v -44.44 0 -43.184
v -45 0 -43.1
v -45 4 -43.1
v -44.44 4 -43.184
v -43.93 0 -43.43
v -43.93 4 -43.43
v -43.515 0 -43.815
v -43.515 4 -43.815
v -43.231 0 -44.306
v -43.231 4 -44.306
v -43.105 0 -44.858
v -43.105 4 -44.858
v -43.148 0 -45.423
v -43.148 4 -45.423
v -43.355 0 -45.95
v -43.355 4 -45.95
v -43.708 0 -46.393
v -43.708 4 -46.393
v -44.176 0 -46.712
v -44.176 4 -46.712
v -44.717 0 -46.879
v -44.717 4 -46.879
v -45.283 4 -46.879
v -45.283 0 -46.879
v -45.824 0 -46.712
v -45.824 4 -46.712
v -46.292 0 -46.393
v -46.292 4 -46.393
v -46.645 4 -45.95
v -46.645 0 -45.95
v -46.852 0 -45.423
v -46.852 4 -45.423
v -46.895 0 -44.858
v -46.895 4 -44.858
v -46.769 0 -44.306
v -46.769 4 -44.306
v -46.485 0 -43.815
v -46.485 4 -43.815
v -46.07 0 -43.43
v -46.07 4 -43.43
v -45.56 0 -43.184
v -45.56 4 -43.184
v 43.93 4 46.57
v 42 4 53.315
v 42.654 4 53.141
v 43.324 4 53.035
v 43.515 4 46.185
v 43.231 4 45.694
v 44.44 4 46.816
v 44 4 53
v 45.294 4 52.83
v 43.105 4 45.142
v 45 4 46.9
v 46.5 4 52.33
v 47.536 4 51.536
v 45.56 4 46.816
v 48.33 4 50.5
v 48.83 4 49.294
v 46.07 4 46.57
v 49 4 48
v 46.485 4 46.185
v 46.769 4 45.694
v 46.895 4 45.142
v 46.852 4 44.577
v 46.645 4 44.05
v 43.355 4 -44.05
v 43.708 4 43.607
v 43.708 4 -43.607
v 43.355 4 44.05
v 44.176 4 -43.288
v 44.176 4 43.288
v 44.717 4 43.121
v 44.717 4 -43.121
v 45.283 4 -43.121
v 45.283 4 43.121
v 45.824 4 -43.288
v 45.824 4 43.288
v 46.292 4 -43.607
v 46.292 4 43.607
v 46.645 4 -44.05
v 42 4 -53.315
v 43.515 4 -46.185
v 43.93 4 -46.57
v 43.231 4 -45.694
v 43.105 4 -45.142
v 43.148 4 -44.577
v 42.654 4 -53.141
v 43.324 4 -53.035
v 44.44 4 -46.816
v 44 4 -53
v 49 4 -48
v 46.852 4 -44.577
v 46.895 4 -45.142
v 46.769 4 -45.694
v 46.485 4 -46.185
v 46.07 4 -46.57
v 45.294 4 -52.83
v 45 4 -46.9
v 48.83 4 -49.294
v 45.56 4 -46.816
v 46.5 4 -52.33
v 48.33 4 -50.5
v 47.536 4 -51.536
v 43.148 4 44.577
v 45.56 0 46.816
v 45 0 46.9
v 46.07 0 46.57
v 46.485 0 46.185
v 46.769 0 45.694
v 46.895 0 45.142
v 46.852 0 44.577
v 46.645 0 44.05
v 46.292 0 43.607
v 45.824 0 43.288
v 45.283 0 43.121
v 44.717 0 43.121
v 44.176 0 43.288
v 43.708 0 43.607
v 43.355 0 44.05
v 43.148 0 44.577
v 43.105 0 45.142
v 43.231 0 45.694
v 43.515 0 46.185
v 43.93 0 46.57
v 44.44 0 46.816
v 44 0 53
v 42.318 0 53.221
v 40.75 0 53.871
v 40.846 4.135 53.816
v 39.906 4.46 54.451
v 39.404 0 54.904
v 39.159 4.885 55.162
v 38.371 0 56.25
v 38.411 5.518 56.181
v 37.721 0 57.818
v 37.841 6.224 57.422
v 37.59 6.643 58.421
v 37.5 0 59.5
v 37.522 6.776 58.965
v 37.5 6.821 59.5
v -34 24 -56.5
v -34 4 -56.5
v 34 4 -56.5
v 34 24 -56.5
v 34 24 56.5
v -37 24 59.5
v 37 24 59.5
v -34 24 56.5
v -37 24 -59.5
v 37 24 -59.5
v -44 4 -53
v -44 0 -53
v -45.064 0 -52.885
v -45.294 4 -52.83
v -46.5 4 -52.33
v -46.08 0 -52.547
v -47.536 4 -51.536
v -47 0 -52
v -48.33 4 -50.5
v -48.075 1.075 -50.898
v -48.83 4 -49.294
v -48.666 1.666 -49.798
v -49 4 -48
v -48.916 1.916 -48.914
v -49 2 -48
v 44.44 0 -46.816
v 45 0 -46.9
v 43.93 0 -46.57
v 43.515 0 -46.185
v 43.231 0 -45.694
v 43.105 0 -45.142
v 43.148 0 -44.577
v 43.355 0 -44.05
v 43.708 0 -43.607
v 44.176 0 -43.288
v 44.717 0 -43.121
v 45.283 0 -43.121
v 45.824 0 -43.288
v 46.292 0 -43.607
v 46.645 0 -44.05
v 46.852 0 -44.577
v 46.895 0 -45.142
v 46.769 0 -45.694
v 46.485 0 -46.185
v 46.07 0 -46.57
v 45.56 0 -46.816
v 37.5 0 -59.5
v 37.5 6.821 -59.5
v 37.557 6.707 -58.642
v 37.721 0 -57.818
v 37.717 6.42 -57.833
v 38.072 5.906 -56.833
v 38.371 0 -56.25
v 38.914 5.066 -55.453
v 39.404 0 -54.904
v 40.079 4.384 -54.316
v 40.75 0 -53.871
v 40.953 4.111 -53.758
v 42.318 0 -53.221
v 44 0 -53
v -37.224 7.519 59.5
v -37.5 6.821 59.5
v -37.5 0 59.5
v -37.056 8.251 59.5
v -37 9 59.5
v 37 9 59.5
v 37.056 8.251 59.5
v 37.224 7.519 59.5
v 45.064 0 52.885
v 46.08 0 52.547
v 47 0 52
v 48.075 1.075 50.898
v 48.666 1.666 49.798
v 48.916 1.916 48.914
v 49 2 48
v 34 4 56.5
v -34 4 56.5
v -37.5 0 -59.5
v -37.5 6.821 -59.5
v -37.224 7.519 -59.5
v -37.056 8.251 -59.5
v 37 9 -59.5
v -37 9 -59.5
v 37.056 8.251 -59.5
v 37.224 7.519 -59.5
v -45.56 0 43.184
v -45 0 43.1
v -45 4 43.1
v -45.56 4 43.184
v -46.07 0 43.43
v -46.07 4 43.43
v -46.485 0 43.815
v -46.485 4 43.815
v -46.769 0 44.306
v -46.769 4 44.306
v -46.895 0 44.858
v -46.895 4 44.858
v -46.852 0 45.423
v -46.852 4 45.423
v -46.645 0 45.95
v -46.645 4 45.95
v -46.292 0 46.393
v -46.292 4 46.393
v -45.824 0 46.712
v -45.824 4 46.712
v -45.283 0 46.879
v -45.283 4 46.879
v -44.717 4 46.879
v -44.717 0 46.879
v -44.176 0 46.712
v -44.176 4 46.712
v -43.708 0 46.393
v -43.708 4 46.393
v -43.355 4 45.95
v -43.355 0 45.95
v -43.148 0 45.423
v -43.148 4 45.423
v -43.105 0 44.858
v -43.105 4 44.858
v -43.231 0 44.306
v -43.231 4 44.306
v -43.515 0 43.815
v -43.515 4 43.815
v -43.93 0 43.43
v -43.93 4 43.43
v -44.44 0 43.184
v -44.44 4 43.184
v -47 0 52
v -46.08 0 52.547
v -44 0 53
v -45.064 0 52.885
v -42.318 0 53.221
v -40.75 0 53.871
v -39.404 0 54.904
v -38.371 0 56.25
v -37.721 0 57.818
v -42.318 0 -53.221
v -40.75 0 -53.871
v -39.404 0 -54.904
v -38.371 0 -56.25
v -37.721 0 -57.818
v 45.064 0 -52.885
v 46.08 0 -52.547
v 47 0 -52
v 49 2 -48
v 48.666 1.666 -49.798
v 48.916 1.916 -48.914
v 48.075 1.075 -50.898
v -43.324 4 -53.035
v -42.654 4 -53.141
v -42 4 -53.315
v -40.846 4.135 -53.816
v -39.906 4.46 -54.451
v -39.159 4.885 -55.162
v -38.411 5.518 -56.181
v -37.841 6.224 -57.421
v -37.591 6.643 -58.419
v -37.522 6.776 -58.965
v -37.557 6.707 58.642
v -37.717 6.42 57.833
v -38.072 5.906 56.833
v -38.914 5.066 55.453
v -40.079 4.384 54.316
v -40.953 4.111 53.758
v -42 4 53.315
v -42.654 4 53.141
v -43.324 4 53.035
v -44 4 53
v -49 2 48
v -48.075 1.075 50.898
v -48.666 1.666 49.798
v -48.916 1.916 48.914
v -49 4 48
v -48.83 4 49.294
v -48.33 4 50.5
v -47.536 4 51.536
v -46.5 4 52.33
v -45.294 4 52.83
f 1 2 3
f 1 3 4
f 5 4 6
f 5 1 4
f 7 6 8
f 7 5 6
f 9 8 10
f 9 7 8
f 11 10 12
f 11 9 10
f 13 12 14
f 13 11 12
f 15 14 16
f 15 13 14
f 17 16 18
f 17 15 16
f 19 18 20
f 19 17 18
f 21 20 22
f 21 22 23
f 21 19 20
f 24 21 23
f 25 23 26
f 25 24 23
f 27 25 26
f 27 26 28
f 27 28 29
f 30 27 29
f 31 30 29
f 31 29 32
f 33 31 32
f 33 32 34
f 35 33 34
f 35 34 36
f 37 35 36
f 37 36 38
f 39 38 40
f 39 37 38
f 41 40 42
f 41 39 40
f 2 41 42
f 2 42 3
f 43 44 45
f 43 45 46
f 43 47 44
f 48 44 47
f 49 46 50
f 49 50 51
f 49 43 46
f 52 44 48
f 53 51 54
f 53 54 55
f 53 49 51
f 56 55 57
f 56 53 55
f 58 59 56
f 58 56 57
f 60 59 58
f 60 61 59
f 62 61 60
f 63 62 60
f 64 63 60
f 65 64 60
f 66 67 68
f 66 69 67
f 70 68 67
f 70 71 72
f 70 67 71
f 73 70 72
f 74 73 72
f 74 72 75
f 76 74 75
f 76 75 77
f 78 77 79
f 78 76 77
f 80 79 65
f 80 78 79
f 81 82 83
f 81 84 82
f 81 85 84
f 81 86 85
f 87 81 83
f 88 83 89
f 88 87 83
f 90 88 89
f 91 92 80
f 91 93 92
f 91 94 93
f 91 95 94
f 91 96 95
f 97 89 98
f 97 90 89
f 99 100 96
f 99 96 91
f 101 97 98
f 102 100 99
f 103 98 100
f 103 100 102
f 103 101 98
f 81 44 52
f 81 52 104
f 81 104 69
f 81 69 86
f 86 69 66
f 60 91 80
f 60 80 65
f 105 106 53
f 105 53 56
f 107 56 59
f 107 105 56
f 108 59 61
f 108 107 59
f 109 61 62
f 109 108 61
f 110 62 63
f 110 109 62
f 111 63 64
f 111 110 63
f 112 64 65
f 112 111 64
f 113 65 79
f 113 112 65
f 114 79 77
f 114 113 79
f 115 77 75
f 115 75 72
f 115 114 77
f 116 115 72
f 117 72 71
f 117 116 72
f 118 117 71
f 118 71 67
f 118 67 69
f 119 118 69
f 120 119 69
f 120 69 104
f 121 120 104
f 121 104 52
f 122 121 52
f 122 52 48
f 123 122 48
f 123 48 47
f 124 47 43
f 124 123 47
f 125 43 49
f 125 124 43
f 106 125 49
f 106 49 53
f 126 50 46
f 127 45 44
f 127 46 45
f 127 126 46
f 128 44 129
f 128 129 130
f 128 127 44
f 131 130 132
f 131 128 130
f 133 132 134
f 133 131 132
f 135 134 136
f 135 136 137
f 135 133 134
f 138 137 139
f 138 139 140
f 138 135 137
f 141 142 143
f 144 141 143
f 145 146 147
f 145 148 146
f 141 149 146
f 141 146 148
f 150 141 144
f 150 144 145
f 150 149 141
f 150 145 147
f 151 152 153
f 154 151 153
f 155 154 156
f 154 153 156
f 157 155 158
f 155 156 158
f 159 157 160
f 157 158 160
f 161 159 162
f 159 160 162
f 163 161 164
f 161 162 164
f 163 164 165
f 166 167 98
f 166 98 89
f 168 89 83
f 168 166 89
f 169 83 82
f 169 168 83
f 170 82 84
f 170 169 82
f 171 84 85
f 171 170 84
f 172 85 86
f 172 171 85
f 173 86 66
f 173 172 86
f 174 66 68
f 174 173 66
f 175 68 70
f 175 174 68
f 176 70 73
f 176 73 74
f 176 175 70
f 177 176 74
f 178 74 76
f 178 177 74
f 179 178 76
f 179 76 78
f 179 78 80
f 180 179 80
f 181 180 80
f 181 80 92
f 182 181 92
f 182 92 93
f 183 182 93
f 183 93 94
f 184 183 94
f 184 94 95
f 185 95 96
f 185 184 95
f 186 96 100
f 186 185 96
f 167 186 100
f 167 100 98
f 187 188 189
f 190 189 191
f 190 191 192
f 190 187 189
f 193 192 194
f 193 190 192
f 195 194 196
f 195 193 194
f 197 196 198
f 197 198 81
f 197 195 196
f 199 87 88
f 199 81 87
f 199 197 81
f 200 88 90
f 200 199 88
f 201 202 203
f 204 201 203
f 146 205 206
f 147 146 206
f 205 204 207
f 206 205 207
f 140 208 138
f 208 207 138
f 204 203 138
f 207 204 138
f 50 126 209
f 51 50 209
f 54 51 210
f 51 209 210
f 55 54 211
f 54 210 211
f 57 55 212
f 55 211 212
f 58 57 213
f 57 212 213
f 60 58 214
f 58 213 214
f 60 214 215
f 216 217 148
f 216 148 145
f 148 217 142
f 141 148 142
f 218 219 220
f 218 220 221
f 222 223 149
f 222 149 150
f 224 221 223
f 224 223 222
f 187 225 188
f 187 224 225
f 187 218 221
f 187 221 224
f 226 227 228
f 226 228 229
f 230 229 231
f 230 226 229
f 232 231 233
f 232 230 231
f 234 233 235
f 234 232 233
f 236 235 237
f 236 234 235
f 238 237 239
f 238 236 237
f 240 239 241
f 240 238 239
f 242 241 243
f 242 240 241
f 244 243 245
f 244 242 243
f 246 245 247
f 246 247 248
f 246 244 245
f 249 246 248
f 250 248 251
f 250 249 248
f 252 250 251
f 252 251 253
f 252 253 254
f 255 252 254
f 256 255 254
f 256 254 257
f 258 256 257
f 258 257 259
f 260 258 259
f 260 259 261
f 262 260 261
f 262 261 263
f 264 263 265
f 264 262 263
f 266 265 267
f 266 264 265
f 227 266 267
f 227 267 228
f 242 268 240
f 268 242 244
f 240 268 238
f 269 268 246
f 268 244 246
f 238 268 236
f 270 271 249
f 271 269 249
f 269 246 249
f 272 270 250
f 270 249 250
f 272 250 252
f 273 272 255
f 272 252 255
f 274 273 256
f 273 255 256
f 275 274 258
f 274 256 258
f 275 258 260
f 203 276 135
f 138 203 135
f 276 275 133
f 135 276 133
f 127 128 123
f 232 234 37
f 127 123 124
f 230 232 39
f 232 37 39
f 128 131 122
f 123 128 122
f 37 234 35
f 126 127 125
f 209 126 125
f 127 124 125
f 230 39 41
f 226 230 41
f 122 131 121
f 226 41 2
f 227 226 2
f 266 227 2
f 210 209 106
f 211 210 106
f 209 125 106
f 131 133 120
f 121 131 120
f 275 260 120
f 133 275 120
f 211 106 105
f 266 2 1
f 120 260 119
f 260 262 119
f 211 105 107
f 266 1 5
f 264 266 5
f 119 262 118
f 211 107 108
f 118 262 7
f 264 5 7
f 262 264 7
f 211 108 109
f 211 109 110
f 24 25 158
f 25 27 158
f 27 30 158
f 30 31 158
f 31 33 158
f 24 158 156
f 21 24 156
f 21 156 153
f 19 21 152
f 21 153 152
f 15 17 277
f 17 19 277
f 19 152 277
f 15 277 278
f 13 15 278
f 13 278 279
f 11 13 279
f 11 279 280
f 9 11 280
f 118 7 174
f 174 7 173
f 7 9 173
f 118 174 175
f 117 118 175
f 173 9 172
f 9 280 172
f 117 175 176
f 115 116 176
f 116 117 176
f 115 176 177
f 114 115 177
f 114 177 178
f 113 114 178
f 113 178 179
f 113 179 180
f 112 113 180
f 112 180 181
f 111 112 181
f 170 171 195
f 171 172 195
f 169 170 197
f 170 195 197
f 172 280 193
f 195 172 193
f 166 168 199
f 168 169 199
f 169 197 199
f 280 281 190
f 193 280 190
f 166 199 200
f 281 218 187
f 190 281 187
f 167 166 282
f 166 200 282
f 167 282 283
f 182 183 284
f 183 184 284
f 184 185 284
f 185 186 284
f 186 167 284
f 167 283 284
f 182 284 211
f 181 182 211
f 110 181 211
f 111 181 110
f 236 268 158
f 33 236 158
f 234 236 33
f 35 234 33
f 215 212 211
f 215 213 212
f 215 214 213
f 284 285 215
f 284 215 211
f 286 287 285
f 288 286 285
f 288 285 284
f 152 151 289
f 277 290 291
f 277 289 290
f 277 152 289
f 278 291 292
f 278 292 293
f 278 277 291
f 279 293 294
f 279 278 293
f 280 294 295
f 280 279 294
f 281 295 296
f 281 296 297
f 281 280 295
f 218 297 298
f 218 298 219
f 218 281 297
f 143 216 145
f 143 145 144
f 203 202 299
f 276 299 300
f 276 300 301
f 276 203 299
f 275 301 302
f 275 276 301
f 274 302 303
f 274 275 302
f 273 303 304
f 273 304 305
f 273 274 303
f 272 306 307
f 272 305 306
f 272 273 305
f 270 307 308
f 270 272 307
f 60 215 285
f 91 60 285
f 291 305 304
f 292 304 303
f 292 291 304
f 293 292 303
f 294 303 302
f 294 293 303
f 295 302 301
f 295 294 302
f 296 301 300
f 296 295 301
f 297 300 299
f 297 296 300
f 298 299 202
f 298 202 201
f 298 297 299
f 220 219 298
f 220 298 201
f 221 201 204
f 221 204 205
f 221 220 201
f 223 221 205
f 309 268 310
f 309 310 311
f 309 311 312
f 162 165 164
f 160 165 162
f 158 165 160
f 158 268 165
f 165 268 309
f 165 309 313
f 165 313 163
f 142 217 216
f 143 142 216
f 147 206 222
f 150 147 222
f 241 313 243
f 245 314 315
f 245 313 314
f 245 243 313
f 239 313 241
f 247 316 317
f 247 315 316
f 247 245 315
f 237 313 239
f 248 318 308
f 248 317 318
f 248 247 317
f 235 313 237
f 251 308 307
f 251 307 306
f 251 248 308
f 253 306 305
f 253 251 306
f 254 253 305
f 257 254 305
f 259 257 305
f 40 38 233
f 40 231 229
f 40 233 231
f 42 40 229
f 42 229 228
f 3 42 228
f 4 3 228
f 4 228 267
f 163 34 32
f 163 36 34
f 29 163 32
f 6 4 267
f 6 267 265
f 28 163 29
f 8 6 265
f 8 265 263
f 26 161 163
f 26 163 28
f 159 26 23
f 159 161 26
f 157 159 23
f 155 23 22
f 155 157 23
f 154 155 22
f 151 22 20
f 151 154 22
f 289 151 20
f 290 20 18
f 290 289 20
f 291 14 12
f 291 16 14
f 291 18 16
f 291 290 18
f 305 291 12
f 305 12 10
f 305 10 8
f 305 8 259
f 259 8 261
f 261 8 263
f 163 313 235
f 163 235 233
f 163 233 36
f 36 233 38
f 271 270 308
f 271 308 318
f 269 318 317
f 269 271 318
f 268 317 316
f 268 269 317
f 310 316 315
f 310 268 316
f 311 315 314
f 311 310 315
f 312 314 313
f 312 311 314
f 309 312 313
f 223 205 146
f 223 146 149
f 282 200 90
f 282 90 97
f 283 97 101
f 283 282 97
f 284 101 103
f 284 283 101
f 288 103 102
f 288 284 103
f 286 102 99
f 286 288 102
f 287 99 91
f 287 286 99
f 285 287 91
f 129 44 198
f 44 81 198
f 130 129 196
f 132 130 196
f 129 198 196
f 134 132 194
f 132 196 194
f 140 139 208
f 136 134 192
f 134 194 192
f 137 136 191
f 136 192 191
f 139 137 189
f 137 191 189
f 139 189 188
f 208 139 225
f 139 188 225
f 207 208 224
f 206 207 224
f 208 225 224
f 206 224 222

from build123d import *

# Parameters (mm, degrees)
SKETCH_1_W               = 98
SKETCH_1_H               = 119
SKETCH_1_R               = 1.9
EXTRUDE_1_DEPTH          = 4
SKETCH_2_W               = 74
SKETCH_2_H               = 119
SKETCH_2_W_2             = 68
SKETCH_2_H_2             = 113
EXTRUDE_1_2_DEPTH        = 20
FILLET_1_R               = 5
CHAMFER_1_SIZE           = 2
CUT_EXTRUDE_1_DEPTH      = 80.631965943
CUT_EXTRUDE_1_DEPTH_BACK = 80.631965943
SKETCH_3_R               = 6.5
FILLET_2_R               = 5


with BuildPart() as part:
    # Эскиз1 → Extrude 1 (new body)
    with BuildSketch(Plane(origin=(0, 0, 0), x_dir=(1, 0, 0), z_dir=(0, 1, 0))):
        Rectangle(SKETCH_1_W, SKETCH_1_H)
        with Locations(Location((-45, 45, 0), (0, 0, 270))):
            Circle(SKETCH_1_R, mode=Mode.SUBTRACT)
        with Locations(Location((45, 45, 0), (0, 0, 90))):
            Circle(SKETCH_1_R, mode=Mode.SUBTRACT)
        with Locations(Location((45, -45, 0), (0, 0, 270))):
            Circle(SKETCH_1_R, mode=Mode.SUBTRACT)
        with Locations(Location((-45, -45, 0), (0, 0, 90))):
            Circle(SKETCH_1_R, mode=Mode.SUBTRACT)
    extrude(amount=EXTRUDE_1_DEPTH)

    # Эскиз2 → Extrude 1 2 (add)
    with BuildSketch(Plane(origin=(0, 4, 0), x_dir=(1, 0, 0), z_dir=(0, 1, 0))):
        Rectangle(SKETCH_2_W, SKETCH_2_H)
        Rectangle(SKETCH_2_W_2, SKETCH_2_H_2, mode=Mode.SUBTRACT)
    extrude(amount=EXTRUDE_1_2_DEPTH)

    # Скругление1
    fillet_1_edges = [part.edges().sort_by_distance(p)[0] for p in [
        (37, 4, 0),
        (-37, 4, 0),
    ]]
    fillet(fillet_1_edges, radius=FILLET_1_R)

    # Фаска1
    chamfer_1_edges = [part.edges().sort_by_distance(p)[0] for p in [
        (-49, 0, 0),
        (49, 0, 0),
    ]]
    chamfer(chamfer_1_edges, length=CHAMFER_1_SIZE)

    # Эскиз3 → Вырез-Вытянуть1 (cut, two sides: drawn at the far end of the back side and taken through both)
    with BuildSketch(Plane(origin=(0, 4, 0), x_dir=(1, 0, 0), z_dir=(0, 1, 0)).offset(-CUT_EXTRUDE_1_DEPTH_BACK)):
        with Locations((44, 59.5)):
            Circle(SKETCH_3_R)
        with Locations((-44, 59.5)):
            Circle(SKETCH_3_R)
        with Locations((44, -59.5)):
            Circle(SKETCH_3_R)
        with Locations((-44, -59.5)):
            Circle(SKETCH_3_R)
    extrude(amount=CUT_EXTRUDE_1_DEPTH + CUT_EXTRUDE_1_DEPTH_BACK, mode=Mode.SUBTRACT)

    # Скругление2
    fillet_2_edges = [part.edges().sort_by_distance(p)[0] for p in [
        (-49, 3, 55.346688069),
        (49, 3, 55.346688069),
        (-49, 3, -55.346688069),
        (49, 3, -55.346688069),
    ]]
    fillet(fillet_2_edges, radius=FILLET_2_R)


solid = part.part
